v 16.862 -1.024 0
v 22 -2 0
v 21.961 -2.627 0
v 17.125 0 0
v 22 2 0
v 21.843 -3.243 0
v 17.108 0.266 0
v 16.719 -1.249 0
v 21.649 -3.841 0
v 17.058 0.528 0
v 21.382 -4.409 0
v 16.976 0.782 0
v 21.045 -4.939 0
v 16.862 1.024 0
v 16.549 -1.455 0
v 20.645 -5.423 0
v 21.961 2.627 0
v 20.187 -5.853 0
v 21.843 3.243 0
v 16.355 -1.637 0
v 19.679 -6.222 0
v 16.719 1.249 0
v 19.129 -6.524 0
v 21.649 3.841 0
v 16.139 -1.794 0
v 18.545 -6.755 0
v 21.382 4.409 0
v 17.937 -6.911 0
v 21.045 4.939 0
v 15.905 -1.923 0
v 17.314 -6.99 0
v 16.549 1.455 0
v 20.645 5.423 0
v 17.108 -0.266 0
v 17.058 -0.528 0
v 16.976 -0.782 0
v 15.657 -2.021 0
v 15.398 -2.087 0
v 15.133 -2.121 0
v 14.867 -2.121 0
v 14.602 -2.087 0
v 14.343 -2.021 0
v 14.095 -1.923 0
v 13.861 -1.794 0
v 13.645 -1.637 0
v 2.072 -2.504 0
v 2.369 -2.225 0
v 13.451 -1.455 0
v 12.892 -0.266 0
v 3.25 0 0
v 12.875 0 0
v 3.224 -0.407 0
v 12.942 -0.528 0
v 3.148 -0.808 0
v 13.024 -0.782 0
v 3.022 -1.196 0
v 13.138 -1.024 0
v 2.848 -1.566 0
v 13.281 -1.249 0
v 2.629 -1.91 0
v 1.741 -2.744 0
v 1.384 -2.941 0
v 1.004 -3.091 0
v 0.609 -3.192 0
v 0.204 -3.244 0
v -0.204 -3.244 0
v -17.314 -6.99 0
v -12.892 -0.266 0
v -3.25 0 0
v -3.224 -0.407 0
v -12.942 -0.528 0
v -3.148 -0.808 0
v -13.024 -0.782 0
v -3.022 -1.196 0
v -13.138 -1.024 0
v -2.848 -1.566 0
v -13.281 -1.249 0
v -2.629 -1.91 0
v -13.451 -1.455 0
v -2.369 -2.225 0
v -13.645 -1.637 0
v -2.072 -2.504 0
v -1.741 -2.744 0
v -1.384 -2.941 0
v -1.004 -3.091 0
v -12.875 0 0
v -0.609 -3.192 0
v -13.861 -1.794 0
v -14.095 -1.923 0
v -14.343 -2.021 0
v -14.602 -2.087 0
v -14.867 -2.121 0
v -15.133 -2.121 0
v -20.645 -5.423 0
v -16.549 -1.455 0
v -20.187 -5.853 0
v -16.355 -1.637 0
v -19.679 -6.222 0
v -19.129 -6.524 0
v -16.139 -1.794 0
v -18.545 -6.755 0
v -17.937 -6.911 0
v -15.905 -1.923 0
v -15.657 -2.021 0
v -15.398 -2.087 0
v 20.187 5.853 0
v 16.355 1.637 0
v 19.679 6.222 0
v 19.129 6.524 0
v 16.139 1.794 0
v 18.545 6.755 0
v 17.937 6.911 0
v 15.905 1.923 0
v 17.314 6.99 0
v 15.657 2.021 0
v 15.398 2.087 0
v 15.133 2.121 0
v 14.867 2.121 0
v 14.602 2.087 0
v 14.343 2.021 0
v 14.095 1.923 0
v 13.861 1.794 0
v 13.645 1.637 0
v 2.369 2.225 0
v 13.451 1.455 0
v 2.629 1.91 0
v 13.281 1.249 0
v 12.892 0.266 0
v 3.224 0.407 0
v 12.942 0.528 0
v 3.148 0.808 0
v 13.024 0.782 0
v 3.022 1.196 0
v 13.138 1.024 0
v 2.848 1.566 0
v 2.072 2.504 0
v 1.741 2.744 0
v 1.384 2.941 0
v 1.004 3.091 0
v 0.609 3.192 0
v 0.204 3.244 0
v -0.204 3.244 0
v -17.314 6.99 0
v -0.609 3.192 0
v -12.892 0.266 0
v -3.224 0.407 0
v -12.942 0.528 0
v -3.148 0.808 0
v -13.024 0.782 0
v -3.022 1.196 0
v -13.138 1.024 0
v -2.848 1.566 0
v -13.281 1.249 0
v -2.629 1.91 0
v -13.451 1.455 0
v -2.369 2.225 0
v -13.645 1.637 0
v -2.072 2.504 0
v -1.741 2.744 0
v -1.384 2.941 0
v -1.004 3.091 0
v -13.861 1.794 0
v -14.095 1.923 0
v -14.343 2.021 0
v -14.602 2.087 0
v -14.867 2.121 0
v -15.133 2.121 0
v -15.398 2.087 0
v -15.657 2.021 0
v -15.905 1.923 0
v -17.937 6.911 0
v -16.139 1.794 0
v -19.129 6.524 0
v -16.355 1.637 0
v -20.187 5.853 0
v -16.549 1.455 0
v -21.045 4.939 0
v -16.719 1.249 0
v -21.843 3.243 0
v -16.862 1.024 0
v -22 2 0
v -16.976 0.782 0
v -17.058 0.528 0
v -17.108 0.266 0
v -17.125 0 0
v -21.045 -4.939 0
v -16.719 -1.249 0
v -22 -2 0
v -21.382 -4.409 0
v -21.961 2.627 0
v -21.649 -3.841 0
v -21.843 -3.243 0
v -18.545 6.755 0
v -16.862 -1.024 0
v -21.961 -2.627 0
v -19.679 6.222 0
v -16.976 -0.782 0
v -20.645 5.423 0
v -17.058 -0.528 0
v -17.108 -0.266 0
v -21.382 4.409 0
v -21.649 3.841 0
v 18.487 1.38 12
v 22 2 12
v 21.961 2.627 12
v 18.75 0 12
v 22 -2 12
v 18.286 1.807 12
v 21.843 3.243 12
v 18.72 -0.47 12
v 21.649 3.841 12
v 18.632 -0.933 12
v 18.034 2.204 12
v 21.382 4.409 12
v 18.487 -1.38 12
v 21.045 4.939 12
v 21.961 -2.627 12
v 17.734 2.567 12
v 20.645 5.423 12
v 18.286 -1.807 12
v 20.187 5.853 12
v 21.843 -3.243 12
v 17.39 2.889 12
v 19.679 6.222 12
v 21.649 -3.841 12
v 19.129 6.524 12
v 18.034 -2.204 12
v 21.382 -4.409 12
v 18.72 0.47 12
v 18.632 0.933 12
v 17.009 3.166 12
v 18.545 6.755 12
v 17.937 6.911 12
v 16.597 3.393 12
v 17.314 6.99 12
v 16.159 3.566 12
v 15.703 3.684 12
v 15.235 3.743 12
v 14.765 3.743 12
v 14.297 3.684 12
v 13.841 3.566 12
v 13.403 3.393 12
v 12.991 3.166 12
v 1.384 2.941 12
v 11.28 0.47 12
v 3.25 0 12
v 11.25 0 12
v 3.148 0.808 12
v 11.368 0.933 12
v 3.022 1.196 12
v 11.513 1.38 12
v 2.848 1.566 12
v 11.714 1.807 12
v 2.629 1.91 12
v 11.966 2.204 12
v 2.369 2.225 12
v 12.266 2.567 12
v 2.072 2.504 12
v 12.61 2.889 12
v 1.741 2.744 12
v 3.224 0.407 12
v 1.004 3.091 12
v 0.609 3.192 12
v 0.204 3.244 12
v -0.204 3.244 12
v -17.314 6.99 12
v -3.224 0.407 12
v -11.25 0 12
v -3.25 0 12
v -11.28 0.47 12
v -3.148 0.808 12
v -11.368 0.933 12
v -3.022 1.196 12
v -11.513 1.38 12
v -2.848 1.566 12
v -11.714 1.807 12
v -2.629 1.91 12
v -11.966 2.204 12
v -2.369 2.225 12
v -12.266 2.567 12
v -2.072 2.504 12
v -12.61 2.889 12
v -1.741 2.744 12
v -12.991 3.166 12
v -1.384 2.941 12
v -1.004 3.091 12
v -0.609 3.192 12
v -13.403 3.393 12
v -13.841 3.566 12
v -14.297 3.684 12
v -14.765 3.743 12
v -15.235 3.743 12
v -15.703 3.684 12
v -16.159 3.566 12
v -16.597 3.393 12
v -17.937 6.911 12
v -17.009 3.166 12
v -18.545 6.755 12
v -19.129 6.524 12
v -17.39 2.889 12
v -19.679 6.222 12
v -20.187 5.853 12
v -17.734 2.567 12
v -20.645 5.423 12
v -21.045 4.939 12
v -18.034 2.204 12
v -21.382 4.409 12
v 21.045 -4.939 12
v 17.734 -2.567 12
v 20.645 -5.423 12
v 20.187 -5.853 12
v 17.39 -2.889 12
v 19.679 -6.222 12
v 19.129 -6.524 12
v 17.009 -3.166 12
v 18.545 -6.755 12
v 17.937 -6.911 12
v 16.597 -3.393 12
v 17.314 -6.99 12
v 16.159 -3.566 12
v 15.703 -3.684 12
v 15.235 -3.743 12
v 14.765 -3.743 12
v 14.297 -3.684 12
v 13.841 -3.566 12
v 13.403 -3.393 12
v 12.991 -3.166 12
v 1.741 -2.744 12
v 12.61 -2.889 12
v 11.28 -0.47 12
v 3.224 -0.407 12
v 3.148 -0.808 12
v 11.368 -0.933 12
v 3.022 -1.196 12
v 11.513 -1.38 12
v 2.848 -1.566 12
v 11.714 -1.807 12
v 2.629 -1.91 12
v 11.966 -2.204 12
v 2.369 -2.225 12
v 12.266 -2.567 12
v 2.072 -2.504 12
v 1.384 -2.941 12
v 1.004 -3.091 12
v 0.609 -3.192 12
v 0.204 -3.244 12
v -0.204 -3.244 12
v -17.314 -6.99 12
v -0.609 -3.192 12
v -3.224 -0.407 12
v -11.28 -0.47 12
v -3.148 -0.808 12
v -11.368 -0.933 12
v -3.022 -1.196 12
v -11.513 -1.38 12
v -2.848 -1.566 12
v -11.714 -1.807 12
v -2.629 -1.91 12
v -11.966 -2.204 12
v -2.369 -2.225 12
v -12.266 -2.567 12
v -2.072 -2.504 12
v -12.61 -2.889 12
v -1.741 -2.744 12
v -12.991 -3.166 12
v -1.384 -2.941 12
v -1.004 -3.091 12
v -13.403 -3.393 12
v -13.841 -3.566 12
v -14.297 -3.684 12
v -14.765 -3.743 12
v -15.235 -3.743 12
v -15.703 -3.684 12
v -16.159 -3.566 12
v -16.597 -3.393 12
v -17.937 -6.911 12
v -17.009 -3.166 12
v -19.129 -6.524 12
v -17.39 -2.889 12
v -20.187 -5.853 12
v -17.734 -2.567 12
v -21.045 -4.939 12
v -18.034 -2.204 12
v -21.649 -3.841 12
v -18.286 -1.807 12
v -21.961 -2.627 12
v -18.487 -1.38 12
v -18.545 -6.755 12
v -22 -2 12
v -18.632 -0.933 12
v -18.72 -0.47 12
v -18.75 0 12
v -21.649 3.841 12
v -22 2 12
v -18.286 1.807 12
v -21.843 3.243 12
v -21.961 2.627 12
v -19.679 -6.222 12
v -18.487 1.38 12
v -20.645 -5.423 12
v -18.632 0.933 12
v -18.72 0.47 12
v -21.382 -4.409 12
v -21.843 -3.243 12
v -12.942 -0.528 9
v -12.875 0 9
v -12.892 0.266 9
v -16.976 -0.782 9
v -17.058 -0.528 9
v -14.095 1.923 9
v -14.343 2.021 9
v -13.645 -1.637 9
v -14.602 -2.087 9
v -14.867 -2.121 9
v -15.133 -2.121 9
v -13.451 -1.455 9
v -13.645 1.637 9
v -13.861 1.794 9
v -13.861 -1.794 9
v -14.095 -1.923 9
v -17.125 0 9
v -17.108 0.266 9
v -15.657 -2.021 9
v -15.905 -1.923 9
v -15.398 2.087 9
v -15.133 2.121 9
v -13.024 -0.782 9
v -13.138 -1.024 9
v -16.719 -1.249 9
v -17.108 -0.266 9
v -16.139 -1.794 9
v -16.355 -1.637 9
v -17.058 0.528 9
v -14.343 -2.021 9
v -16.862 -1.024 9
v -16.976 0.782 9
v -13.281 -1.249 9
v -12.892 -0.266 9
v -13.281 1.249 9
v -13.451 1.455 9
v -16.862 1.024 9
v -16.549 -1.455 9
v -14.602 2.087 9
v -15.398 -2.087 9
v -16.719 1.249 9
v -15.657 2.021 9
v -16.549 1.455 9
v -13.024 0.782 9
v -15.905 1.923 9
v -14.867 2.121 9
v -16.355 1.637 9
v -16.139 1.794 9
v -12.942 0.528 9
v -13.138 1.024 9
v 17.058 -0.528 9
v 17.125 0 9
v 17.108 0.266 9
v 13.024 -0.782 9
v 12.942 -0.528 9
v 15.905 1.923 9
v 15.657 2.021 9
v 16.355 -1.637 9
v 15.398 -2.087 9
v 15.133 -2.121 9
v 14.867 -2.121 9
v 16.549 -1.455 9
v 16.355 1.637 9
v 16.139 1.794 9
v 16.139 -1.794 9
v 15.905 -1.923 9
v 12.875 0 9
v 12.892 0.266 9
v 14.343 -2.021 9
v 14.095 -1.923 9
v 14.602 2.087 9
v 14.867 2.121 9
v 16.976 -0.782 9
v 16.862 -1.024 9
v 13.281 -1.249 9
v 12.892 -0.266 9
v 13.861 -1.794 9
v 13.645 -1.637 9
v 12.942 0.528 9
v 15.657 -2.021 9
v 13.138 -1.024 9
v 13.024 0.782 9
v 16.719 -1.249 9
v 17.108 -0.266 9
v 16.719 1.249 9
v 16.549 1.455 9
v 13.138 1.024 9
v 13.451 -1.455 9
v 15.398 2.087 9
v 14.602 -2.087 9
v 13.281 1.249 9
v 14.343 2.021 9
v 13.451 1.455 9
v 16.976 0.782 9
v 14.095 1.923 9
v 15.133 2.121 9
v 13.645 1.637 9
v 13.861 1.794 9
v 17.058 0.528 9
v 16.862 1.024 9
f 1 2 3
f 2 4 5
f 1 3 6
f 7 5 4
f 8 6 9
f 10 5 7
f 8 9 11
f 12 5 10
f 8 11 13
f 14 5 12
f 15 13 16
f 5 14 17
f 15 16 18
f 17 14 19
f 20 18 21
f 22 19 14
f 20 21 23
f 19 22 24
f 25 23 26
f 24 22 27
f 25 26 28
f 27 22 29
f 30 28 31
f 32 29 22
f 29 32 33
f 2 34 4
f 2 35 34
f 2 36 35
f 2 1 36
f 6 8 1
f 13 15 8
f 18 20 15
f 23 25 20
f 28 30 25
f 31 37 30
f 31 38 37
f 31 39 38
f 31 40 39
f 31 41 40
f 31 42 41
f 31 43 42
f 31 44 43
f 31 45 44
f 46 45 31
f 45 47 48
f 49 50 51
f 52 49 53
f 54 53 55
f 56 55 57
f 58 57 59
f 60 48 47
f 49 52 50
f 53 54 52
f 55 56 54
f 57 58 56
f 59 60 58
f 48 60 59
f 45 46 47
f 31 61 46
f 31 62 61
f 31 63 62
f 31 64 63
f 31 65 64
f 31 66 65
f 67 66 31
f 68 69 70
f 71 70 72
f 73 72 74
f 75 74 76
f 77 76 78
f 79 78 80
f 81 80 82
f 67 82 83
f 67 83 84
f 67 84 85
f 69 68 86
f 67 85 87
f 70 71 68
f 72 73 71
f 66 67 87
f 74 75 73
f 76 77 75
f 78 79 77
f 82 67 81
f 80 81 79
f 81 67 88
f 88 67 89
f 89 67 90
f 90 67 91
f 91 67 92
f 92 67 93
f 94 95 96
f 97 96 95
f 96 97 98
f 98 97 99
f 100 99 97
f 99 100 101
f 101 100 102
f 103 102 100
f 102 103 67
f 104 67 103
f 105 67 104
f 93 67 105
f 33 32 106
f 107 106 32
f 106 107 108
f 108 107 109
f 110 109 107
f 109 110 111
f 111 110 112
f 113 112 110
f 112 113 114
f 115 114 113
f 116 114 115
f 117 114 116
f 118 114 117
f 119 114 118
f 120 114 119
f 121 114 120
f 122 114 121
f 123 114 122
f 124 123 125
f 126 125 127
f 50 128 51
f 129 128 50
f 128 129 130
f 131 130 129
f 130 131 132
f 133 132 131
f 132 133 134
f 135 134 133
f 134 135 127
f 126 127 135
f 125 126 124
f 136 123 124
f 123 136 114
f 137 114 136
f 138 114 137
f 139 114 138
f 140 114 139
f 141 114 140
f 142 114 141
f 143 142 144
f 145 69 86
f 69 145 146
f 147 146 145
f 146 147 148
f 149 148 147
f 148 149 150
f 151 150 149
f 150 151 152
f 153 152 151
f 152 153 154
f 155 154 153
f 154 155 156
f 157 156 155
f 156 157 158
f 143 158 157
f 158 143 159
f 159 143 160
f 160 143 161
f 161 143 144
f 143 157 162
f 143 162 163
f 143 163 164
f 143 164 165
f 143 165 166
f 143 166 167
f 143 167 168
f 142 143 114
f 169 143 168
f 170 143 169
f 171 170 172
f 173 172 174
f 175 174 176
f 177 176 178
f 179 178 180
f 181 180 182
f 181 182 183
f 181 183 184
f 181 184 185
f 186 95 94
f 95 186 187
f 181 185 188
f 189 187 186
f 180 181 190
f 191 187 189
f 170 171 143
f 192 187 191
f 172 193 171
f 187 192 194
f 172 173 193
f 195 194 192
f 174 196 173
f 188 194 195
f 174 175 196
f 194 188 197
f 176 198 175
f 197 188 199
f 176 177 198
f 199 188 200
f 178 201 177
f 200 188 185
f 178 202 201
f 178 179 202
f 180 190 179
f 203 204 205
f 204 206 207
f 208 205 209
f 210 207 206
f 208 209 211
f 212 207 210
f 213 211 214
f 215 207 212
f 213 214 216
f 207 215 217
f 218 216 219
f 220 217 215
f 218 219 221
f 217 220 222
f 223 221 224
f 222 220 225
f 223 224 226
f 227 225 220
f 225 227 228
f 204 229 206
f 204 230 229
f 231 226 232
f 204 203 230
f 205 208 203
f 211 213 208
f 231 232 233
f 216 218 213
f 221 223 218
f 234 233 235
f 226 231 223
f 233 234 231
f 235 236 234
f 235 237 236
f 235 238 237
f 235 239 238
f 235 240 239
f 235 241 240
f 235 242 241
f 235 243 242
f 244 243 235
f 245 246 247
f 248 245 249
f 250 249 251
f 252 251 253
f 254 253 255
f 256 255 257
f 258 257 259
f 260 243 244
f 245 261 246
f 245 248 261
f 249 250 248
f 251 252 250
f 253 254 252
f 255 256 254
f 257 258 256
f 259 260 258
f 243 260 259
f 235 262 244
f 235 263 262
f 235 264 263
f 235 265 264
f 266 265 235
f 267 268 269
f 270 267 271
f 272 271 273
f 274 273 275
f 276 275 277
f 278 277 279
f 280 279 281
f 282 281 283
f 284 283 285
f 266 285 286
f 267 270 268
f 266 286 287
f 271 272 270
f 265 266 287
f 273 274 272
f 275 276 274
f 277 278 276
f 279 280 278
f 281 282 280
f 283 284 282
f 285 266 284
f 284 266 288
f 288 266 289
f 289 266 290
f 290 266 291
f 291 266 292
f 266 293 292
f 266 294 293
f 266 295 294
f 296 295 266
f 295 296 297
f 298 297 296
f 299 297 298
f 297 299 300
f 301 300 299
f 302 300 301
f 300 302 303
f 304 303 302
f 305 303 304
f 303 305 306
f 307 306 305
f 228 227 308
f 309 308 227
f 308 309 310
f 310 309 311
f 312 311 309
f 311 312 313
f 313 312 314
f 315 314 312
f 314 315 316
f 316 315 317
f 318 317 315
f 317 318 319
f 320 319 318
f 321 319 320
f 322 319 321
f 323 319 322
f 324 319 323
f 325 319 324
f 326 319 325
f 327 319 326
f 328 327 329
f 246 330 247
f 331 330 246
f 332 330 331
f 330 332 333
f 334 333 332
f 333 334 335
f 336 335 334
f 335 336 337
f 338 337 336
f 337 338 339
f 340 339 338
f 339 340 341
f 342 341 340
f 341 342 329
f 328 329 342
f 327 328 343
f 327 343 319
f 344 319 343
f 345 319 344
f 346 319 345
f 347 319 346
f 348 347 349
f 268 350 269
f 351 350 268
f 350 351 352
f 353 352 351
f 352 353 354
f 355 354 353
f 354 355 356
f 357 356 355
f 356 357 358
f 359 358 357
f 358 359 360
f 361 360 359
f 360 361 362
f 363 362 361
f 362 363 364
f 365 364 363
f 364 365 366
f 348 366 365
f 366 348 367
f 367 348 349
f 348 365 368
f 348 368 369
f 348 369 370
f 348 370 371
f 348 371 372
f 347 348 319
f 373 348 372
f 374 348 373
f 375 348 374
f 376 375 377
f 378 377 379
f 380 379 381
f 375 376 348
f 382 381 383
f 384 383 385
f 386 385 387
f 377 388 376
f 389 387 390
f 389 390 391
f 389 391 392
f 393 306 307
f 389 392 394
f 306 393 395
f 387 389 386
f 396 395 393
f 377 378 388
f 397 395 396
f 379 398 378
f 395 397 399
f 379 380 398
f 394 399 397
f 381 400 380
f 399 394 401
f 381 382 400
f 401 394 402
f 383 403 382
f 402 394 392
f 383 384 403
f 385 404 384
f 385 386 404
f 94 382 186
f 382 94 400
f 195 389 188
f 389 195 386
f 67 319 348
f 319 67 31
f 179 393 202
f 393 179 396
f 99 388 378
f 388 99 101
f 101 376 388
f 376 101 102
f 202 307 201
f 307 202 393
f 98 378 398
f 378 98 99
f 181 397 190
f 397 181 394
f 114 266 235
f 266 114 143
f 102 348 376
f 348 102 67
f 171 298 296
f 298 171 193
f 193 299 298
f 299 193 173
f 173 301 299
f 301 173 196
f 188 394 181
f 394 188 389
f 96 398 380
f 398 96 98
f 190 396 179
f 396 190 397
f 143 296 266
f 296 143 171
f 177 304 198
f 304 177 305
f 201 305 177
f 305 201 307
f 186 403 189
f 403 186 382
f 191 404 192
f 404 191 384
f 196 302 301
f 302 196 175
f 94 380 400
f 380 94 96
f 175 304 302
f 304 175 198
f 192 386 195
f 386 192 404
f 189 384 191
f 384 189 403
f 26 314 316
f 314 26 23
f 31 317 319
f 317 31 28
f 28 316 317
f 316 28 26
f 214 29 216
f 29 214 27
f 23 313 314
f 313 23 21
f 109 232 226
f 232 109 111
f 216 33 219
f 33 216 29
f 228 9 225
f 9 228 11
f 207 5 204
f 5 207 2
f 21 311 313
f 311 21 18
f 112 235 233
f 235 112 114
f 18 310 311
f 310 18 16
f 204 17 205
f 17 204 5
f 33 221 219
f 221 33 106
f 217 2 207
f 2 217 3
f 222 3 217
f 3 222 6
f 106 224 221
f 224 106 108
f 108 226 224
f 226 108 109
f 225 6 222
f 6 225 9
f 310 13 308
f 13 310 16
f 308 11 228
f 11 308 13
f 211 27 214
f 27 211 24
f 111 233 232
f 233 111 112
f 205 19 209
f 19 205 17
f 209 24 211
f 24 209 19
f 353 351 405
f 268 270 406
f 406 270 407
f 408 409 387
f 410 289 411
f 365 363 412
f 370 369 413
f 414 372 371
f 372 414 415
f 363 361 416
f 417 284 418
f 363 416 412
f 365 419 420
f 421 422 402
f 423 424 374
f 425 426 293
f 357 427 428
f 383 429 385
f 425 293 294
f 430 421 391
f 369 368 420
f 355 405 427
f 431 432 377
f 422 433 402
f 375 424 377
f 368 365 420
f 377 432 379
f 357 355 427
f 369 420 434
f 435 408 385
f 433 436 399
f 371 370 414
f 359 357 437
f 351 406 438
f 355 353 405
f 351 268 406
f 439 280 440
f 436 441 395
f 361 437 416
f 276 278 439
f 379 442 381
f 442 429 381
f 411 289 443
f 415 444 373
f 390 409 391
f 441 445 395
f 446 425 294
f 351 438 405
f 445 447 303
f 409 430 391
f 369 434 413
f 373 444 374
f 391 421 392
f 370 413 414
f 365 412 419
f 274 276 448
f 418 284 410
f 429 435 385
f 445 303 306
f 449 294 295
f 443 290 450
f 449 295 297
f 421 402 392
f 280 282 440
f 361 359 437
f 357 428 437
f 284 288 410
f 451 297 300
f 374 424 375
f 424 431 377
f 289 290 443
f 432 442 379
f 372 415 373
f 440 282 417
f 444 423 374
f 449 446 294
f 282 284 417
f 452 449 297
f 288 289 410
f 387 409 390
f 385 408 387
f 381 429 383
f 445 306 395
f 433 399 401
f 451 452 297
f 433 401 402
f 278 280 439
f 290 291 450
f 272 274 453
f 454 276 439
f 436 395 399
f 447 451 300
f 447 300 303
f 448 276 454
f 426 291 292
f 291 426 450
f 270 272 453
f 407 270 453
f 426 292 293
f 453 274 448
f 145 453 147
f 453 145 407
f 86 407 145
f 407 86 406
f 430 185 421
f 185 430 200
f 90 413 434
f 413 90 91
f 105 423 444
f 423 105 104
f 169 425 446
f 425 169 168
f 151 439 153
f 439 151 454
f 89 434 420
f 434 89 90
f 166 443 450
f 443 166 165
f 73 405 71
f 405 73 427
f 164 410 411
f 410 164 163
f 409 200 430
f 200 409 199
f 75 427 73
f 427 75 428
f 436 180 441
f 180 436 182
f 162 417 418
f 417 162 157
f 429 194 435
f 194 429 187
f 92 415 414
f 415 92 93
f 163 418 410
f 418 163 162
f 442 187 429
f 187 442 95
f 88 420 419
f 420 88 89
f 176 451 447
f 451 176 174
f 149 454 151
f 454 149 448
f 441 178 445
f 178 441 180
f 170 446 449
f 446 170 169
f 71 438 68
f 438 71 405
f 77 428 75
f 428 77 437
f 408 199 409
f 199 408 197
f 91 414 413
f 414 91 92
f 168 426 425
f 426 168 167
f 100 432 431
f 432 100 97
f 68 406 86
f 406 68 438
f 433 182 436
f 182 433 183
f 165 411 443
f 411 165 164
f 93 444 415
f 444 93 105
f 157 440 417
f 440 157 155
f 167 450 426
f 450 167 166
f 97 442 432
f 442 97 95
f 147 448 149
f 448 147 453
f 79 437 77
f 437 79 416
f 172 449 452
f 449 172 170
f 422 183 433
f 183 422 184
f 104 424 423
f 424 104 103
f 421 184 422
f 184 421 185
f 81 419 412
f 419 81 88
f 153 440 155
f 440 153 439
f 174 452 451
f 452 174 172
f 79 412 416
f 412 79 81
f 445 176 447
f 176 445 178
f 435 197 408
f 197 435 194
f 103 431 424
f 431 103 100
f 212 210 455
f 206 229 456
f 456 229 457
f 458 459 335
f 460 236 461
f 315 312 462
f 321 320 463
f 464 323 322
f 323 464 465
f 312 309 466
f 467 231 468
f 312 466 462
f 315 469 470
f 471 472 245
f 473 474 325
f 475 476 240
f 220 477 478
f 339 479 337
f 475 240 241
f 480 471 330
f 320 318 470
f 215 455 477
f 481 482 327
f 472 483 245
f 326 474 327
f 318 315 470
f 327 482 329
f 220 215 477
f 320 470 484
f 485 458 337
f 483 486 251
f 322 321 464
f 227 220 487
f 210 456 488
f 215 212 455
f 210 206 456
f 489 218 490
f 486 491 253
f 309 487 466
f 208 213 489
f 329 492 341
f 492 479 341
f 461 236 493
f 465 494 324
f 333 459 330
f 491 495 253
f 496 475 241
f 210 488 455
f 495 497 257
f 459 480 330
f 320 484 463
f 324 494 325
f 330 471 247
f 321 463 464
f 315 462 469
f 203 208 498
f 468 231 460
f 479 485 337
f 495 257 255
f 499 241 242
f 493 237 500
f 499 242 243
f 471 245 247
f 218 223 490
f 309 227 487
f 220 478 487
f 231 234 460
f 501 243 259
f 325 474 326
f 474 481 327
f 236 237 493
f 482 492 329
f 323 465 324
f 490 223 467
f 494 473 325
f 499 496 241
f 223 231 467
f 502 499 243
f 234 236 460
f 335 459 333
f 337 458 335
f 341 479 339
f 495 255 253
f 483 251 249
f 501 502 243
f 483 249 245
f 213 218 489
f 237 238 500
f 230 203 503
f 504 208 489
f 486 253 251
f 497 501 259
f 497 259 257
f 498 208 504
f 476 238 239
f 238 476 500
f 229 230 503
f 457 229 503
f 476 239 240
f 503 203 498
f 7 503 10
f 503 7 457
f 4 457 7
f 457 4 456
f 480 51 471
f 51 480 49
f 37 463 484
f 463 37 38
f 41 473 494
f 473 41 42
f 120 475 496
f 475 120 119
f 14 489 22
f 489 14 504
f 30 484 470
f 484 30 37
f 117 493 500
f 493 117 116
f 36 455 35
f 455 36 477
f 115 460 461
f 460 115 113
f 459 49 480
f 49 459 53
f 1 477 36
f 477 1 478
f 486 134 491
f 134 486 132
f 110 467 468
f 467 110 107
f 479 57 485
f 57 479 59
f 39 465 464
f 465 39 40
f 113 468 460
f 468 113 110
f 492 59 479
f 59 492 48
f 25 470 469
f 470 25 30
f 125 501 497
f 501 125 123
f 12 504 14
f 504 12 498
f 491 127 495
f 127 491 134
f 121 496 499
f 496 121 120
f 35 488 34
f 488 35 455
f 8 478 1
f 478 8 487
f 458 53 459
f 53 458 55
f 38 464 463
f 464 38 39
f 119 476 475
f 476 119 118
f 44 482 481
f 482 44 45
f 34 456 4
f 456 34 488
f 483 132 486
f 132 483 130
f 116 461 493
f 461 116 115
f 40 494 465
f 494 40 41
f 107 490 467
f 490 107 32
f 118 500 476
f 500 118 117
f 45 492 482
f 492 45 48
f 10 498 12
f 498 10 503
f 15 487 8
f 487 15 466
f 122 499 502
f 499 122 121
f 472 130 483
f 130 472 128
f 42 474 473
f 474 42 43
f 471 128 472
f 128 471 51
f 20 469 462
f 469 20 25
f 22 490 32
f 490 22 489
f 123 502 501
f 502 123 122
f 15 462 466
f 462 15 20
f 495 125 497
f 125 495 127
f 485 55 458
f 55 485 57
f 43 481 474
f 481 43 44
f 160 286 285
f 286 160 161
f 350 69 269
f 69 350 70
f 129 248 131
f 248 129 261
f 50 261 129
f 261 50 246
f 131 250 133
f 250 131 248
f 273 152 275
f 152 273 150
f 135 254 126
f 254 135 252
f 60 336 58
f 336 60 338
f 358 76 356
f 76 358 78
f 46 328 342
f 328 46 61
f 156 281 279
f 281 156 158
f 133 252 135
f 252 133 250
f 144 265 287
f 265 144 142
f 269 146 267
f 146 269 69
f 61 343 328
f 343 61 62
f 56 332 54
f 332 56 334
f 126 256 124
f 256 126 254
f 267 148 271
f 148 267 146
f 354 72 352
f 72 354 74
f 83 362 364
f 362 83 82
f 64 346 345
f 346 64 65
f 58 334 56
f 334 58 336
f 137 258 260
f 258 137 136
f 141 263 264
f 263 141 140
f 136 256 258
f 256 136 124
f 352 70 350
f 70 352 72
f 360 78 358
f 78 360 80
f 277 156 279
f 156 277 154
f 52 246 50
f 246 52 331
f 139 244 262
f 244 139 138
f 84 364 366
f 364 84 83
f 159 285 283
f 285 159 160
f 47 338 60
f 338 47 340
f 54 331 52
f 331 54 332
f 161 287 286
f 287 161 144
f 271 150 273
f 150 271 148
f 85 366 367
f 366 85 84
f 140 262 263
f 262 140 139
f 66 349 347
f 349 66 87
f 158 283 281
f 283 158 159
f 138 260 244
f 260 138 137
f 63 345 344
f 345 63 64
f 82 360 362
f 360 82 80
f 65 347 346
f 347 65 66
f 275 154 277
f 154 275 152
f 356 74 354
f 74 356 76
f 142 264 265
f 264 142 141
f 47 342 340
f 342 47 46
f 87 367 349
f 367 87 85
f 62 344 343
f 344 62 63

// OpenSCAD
$fn = 50;


difference() {
	union() {
		cylinder(h = 12, r = 7.0000000000);
		translate(v = [-7.5000000000, 0.0000000000, 0]) {
			hull() {
				translate(v = [-9.5000000000, 2.0000000000, 0]) {
					cylinder(h = 12, r = 5);
				}
				translate(v = [9.5000000000, 2.0000000000, 0]) {
					cylinder(h = 12, r = 5);
				}
				translate(v = [-9.5000000000, -2.0000000000, 0]) {
					cylinder(h = 12, r = 5);
				}
				translate(v = [9.5000000000, -2.0000000000, 0]) {
					cylinder(h = 12, r = 5);
				}
			}
		}
		translate(v = [-7.5000000000, 0.0000000000, 0]) {
			hull() {
				translate(v = [-9.5000000000, 2.0000000000, 0]) {
					cylinder(h = 12, r = 5);
				}
				translate(v = [9.5000000000, 2.0000000000, 0]) {
					cylinder(h = 12, r = 5);
				}
				translate(v = [-9.5000000000, -2.0000000000, 0]) {
					cylinder(h = 12, r = 5);
				}
				translate(v = [9.5000000000, -2.0000000000, 0]) {
					cylinder(h = 12, r = 5);
				}
			}
		}
		translate(v = [7.5000000000, 0.0000000000, 0]) {
			hull() {
				translate(v = [-9.5000000000, 2.0000000000, 0]) {
					cylinder(h = 12, r = 5);
				}
				translate(v = [9.5000000000, 2.0000000000, 0]) {
					cylinder(h = 12, r = 5);
				}
				translate(v = [-9.5000000000, -2.0000000000, 0]) {
					cylinder(h = 12, r = 5);
				}
				translate(v = [9.5000000000, -2.0000000000, 0]) {
					cylinder(h = 12, r = 5);
				}
			}
		}
		translate(v = [7.5000000000, 0.0000000000, 0]) {
			hull() {
				translate(v = [-9.5000000000, 2.0000000000, 0]) {
					cylinder(h = 12, r = 5);
				}
				translate(v = [9.5000000000, 2.0000000000, 0]) {
					cylinder(h = 12, r = 5);
				}
				translate(v = [-9.5000000000, -2.0000000000, 0]) {
					cylinder(h = 12, r = 5);
				}
				translate(v = [9.5000000000, -2.0000000000, 0]) {
					cylinder(h = 12, r = 5);
				}
			}
		}
	}
	union() {
		translate(v = [-15.0000000000, 0.0000000000, 12]) {
			rotate(a = [0, 0, 0]) {
				difference() {
					union() {
						#translate(v = [0, 0, -12.0000000000]) {
							cylinder(h = 12, r = 2.0000000000);
						}
						#translate(v = [0, 0, -3]) {
							cylinder(h = 3, r1 = 2.1250000000, r2 = 3.7500000000);
						}
						#translate(v = [0, 0, -12.0000000000]) {
							cylinder(h = 12, r = 2.1250000000);
						}
						#translate(v = [0, 0, -12.0000000000]) {
							cylinder(h = 12, r = 2.0000000000);
						}
					}
					union();
				}
			}
		}
		translate(v = [-15.0000000000, 0.0000000000, 12]) {
			rotate(a = [0, 0, 0]) {
				difference() {
					union() {
						#translate(v = [0, 0, -12.0000000000]) {
							cylinder(h = 12, r = 2.0000000000);
						}
						#translate(v = [0, 0, -3]) {
							cylinder(h = 3, r1 = 2.1250000000, r2 = 3.7500000000);
						}
						#translate(v = [0, 0, -12.0000000000]) {
							cylinder(h = 12, r = 2.1250000000);
						}
						#translate(v = [0, 0, -12.0000000000]) {
							cylinder(h = 12, r = 2.0000000000);
						}
					}
					union();
				}
			}
		}
		translate(v = [15.0000000000, 0.0000000000, 12]) {
			rotate(a = [0, 0, 0]) {
				difference() {
					union() {
						#translate(v = [0, 0, -12.0000000000]) {
							cylinder(h = 12, r = 2.0000000000);
						}
						#translate(v = [0, 0, -3]) {
							cylinder(h = 3, r1 = 2.1250000000, r2 = 3.7500000000);
						}
						#translate(v = [0, 0, -12.0000000000]) {
							cylinder(h = 12, r = 2.1250000000);
						}
						#translate(v = [0, 0, -12.0000000000]) {
							cylinder(h = 12, r = 2.0000000000);
						}
					}
					union();
				}
			}
		}
		translate(v = [15.0000000000, 0.0000000000, 12]) {
			rotate(a = [0, 0, 0]) {
				difference() {
					union() {
						#translate(v = [0, 0, -12.0000000000]) {
							cylinder(h = 12, r = 2.0000000000);
						}
						#translate(v = [0, 0, -3]) {
							cylinder(h = 3, r1 = 2.1250000000, r2 = 3.7500000000);
						}
						#translate(v = [0, 0, -12.0000000000]) {
							cylinder(h = 12, r = 2.1250000000);
						}
						#translate(v = [0, 0, -12.0000000000]) {
							cylinder(h = 12, r = 2.0000000000);
						}
					}
					union();
				}
			}
		}
		translate(v = [0, 0, -100]) {
			cylinder(h = 200, r = 3.2500000000);
		}
		translate(v = [0, 0, -100]) {
			cylinder(h = 200, r = 1.8000000000);
		}
	}
}
